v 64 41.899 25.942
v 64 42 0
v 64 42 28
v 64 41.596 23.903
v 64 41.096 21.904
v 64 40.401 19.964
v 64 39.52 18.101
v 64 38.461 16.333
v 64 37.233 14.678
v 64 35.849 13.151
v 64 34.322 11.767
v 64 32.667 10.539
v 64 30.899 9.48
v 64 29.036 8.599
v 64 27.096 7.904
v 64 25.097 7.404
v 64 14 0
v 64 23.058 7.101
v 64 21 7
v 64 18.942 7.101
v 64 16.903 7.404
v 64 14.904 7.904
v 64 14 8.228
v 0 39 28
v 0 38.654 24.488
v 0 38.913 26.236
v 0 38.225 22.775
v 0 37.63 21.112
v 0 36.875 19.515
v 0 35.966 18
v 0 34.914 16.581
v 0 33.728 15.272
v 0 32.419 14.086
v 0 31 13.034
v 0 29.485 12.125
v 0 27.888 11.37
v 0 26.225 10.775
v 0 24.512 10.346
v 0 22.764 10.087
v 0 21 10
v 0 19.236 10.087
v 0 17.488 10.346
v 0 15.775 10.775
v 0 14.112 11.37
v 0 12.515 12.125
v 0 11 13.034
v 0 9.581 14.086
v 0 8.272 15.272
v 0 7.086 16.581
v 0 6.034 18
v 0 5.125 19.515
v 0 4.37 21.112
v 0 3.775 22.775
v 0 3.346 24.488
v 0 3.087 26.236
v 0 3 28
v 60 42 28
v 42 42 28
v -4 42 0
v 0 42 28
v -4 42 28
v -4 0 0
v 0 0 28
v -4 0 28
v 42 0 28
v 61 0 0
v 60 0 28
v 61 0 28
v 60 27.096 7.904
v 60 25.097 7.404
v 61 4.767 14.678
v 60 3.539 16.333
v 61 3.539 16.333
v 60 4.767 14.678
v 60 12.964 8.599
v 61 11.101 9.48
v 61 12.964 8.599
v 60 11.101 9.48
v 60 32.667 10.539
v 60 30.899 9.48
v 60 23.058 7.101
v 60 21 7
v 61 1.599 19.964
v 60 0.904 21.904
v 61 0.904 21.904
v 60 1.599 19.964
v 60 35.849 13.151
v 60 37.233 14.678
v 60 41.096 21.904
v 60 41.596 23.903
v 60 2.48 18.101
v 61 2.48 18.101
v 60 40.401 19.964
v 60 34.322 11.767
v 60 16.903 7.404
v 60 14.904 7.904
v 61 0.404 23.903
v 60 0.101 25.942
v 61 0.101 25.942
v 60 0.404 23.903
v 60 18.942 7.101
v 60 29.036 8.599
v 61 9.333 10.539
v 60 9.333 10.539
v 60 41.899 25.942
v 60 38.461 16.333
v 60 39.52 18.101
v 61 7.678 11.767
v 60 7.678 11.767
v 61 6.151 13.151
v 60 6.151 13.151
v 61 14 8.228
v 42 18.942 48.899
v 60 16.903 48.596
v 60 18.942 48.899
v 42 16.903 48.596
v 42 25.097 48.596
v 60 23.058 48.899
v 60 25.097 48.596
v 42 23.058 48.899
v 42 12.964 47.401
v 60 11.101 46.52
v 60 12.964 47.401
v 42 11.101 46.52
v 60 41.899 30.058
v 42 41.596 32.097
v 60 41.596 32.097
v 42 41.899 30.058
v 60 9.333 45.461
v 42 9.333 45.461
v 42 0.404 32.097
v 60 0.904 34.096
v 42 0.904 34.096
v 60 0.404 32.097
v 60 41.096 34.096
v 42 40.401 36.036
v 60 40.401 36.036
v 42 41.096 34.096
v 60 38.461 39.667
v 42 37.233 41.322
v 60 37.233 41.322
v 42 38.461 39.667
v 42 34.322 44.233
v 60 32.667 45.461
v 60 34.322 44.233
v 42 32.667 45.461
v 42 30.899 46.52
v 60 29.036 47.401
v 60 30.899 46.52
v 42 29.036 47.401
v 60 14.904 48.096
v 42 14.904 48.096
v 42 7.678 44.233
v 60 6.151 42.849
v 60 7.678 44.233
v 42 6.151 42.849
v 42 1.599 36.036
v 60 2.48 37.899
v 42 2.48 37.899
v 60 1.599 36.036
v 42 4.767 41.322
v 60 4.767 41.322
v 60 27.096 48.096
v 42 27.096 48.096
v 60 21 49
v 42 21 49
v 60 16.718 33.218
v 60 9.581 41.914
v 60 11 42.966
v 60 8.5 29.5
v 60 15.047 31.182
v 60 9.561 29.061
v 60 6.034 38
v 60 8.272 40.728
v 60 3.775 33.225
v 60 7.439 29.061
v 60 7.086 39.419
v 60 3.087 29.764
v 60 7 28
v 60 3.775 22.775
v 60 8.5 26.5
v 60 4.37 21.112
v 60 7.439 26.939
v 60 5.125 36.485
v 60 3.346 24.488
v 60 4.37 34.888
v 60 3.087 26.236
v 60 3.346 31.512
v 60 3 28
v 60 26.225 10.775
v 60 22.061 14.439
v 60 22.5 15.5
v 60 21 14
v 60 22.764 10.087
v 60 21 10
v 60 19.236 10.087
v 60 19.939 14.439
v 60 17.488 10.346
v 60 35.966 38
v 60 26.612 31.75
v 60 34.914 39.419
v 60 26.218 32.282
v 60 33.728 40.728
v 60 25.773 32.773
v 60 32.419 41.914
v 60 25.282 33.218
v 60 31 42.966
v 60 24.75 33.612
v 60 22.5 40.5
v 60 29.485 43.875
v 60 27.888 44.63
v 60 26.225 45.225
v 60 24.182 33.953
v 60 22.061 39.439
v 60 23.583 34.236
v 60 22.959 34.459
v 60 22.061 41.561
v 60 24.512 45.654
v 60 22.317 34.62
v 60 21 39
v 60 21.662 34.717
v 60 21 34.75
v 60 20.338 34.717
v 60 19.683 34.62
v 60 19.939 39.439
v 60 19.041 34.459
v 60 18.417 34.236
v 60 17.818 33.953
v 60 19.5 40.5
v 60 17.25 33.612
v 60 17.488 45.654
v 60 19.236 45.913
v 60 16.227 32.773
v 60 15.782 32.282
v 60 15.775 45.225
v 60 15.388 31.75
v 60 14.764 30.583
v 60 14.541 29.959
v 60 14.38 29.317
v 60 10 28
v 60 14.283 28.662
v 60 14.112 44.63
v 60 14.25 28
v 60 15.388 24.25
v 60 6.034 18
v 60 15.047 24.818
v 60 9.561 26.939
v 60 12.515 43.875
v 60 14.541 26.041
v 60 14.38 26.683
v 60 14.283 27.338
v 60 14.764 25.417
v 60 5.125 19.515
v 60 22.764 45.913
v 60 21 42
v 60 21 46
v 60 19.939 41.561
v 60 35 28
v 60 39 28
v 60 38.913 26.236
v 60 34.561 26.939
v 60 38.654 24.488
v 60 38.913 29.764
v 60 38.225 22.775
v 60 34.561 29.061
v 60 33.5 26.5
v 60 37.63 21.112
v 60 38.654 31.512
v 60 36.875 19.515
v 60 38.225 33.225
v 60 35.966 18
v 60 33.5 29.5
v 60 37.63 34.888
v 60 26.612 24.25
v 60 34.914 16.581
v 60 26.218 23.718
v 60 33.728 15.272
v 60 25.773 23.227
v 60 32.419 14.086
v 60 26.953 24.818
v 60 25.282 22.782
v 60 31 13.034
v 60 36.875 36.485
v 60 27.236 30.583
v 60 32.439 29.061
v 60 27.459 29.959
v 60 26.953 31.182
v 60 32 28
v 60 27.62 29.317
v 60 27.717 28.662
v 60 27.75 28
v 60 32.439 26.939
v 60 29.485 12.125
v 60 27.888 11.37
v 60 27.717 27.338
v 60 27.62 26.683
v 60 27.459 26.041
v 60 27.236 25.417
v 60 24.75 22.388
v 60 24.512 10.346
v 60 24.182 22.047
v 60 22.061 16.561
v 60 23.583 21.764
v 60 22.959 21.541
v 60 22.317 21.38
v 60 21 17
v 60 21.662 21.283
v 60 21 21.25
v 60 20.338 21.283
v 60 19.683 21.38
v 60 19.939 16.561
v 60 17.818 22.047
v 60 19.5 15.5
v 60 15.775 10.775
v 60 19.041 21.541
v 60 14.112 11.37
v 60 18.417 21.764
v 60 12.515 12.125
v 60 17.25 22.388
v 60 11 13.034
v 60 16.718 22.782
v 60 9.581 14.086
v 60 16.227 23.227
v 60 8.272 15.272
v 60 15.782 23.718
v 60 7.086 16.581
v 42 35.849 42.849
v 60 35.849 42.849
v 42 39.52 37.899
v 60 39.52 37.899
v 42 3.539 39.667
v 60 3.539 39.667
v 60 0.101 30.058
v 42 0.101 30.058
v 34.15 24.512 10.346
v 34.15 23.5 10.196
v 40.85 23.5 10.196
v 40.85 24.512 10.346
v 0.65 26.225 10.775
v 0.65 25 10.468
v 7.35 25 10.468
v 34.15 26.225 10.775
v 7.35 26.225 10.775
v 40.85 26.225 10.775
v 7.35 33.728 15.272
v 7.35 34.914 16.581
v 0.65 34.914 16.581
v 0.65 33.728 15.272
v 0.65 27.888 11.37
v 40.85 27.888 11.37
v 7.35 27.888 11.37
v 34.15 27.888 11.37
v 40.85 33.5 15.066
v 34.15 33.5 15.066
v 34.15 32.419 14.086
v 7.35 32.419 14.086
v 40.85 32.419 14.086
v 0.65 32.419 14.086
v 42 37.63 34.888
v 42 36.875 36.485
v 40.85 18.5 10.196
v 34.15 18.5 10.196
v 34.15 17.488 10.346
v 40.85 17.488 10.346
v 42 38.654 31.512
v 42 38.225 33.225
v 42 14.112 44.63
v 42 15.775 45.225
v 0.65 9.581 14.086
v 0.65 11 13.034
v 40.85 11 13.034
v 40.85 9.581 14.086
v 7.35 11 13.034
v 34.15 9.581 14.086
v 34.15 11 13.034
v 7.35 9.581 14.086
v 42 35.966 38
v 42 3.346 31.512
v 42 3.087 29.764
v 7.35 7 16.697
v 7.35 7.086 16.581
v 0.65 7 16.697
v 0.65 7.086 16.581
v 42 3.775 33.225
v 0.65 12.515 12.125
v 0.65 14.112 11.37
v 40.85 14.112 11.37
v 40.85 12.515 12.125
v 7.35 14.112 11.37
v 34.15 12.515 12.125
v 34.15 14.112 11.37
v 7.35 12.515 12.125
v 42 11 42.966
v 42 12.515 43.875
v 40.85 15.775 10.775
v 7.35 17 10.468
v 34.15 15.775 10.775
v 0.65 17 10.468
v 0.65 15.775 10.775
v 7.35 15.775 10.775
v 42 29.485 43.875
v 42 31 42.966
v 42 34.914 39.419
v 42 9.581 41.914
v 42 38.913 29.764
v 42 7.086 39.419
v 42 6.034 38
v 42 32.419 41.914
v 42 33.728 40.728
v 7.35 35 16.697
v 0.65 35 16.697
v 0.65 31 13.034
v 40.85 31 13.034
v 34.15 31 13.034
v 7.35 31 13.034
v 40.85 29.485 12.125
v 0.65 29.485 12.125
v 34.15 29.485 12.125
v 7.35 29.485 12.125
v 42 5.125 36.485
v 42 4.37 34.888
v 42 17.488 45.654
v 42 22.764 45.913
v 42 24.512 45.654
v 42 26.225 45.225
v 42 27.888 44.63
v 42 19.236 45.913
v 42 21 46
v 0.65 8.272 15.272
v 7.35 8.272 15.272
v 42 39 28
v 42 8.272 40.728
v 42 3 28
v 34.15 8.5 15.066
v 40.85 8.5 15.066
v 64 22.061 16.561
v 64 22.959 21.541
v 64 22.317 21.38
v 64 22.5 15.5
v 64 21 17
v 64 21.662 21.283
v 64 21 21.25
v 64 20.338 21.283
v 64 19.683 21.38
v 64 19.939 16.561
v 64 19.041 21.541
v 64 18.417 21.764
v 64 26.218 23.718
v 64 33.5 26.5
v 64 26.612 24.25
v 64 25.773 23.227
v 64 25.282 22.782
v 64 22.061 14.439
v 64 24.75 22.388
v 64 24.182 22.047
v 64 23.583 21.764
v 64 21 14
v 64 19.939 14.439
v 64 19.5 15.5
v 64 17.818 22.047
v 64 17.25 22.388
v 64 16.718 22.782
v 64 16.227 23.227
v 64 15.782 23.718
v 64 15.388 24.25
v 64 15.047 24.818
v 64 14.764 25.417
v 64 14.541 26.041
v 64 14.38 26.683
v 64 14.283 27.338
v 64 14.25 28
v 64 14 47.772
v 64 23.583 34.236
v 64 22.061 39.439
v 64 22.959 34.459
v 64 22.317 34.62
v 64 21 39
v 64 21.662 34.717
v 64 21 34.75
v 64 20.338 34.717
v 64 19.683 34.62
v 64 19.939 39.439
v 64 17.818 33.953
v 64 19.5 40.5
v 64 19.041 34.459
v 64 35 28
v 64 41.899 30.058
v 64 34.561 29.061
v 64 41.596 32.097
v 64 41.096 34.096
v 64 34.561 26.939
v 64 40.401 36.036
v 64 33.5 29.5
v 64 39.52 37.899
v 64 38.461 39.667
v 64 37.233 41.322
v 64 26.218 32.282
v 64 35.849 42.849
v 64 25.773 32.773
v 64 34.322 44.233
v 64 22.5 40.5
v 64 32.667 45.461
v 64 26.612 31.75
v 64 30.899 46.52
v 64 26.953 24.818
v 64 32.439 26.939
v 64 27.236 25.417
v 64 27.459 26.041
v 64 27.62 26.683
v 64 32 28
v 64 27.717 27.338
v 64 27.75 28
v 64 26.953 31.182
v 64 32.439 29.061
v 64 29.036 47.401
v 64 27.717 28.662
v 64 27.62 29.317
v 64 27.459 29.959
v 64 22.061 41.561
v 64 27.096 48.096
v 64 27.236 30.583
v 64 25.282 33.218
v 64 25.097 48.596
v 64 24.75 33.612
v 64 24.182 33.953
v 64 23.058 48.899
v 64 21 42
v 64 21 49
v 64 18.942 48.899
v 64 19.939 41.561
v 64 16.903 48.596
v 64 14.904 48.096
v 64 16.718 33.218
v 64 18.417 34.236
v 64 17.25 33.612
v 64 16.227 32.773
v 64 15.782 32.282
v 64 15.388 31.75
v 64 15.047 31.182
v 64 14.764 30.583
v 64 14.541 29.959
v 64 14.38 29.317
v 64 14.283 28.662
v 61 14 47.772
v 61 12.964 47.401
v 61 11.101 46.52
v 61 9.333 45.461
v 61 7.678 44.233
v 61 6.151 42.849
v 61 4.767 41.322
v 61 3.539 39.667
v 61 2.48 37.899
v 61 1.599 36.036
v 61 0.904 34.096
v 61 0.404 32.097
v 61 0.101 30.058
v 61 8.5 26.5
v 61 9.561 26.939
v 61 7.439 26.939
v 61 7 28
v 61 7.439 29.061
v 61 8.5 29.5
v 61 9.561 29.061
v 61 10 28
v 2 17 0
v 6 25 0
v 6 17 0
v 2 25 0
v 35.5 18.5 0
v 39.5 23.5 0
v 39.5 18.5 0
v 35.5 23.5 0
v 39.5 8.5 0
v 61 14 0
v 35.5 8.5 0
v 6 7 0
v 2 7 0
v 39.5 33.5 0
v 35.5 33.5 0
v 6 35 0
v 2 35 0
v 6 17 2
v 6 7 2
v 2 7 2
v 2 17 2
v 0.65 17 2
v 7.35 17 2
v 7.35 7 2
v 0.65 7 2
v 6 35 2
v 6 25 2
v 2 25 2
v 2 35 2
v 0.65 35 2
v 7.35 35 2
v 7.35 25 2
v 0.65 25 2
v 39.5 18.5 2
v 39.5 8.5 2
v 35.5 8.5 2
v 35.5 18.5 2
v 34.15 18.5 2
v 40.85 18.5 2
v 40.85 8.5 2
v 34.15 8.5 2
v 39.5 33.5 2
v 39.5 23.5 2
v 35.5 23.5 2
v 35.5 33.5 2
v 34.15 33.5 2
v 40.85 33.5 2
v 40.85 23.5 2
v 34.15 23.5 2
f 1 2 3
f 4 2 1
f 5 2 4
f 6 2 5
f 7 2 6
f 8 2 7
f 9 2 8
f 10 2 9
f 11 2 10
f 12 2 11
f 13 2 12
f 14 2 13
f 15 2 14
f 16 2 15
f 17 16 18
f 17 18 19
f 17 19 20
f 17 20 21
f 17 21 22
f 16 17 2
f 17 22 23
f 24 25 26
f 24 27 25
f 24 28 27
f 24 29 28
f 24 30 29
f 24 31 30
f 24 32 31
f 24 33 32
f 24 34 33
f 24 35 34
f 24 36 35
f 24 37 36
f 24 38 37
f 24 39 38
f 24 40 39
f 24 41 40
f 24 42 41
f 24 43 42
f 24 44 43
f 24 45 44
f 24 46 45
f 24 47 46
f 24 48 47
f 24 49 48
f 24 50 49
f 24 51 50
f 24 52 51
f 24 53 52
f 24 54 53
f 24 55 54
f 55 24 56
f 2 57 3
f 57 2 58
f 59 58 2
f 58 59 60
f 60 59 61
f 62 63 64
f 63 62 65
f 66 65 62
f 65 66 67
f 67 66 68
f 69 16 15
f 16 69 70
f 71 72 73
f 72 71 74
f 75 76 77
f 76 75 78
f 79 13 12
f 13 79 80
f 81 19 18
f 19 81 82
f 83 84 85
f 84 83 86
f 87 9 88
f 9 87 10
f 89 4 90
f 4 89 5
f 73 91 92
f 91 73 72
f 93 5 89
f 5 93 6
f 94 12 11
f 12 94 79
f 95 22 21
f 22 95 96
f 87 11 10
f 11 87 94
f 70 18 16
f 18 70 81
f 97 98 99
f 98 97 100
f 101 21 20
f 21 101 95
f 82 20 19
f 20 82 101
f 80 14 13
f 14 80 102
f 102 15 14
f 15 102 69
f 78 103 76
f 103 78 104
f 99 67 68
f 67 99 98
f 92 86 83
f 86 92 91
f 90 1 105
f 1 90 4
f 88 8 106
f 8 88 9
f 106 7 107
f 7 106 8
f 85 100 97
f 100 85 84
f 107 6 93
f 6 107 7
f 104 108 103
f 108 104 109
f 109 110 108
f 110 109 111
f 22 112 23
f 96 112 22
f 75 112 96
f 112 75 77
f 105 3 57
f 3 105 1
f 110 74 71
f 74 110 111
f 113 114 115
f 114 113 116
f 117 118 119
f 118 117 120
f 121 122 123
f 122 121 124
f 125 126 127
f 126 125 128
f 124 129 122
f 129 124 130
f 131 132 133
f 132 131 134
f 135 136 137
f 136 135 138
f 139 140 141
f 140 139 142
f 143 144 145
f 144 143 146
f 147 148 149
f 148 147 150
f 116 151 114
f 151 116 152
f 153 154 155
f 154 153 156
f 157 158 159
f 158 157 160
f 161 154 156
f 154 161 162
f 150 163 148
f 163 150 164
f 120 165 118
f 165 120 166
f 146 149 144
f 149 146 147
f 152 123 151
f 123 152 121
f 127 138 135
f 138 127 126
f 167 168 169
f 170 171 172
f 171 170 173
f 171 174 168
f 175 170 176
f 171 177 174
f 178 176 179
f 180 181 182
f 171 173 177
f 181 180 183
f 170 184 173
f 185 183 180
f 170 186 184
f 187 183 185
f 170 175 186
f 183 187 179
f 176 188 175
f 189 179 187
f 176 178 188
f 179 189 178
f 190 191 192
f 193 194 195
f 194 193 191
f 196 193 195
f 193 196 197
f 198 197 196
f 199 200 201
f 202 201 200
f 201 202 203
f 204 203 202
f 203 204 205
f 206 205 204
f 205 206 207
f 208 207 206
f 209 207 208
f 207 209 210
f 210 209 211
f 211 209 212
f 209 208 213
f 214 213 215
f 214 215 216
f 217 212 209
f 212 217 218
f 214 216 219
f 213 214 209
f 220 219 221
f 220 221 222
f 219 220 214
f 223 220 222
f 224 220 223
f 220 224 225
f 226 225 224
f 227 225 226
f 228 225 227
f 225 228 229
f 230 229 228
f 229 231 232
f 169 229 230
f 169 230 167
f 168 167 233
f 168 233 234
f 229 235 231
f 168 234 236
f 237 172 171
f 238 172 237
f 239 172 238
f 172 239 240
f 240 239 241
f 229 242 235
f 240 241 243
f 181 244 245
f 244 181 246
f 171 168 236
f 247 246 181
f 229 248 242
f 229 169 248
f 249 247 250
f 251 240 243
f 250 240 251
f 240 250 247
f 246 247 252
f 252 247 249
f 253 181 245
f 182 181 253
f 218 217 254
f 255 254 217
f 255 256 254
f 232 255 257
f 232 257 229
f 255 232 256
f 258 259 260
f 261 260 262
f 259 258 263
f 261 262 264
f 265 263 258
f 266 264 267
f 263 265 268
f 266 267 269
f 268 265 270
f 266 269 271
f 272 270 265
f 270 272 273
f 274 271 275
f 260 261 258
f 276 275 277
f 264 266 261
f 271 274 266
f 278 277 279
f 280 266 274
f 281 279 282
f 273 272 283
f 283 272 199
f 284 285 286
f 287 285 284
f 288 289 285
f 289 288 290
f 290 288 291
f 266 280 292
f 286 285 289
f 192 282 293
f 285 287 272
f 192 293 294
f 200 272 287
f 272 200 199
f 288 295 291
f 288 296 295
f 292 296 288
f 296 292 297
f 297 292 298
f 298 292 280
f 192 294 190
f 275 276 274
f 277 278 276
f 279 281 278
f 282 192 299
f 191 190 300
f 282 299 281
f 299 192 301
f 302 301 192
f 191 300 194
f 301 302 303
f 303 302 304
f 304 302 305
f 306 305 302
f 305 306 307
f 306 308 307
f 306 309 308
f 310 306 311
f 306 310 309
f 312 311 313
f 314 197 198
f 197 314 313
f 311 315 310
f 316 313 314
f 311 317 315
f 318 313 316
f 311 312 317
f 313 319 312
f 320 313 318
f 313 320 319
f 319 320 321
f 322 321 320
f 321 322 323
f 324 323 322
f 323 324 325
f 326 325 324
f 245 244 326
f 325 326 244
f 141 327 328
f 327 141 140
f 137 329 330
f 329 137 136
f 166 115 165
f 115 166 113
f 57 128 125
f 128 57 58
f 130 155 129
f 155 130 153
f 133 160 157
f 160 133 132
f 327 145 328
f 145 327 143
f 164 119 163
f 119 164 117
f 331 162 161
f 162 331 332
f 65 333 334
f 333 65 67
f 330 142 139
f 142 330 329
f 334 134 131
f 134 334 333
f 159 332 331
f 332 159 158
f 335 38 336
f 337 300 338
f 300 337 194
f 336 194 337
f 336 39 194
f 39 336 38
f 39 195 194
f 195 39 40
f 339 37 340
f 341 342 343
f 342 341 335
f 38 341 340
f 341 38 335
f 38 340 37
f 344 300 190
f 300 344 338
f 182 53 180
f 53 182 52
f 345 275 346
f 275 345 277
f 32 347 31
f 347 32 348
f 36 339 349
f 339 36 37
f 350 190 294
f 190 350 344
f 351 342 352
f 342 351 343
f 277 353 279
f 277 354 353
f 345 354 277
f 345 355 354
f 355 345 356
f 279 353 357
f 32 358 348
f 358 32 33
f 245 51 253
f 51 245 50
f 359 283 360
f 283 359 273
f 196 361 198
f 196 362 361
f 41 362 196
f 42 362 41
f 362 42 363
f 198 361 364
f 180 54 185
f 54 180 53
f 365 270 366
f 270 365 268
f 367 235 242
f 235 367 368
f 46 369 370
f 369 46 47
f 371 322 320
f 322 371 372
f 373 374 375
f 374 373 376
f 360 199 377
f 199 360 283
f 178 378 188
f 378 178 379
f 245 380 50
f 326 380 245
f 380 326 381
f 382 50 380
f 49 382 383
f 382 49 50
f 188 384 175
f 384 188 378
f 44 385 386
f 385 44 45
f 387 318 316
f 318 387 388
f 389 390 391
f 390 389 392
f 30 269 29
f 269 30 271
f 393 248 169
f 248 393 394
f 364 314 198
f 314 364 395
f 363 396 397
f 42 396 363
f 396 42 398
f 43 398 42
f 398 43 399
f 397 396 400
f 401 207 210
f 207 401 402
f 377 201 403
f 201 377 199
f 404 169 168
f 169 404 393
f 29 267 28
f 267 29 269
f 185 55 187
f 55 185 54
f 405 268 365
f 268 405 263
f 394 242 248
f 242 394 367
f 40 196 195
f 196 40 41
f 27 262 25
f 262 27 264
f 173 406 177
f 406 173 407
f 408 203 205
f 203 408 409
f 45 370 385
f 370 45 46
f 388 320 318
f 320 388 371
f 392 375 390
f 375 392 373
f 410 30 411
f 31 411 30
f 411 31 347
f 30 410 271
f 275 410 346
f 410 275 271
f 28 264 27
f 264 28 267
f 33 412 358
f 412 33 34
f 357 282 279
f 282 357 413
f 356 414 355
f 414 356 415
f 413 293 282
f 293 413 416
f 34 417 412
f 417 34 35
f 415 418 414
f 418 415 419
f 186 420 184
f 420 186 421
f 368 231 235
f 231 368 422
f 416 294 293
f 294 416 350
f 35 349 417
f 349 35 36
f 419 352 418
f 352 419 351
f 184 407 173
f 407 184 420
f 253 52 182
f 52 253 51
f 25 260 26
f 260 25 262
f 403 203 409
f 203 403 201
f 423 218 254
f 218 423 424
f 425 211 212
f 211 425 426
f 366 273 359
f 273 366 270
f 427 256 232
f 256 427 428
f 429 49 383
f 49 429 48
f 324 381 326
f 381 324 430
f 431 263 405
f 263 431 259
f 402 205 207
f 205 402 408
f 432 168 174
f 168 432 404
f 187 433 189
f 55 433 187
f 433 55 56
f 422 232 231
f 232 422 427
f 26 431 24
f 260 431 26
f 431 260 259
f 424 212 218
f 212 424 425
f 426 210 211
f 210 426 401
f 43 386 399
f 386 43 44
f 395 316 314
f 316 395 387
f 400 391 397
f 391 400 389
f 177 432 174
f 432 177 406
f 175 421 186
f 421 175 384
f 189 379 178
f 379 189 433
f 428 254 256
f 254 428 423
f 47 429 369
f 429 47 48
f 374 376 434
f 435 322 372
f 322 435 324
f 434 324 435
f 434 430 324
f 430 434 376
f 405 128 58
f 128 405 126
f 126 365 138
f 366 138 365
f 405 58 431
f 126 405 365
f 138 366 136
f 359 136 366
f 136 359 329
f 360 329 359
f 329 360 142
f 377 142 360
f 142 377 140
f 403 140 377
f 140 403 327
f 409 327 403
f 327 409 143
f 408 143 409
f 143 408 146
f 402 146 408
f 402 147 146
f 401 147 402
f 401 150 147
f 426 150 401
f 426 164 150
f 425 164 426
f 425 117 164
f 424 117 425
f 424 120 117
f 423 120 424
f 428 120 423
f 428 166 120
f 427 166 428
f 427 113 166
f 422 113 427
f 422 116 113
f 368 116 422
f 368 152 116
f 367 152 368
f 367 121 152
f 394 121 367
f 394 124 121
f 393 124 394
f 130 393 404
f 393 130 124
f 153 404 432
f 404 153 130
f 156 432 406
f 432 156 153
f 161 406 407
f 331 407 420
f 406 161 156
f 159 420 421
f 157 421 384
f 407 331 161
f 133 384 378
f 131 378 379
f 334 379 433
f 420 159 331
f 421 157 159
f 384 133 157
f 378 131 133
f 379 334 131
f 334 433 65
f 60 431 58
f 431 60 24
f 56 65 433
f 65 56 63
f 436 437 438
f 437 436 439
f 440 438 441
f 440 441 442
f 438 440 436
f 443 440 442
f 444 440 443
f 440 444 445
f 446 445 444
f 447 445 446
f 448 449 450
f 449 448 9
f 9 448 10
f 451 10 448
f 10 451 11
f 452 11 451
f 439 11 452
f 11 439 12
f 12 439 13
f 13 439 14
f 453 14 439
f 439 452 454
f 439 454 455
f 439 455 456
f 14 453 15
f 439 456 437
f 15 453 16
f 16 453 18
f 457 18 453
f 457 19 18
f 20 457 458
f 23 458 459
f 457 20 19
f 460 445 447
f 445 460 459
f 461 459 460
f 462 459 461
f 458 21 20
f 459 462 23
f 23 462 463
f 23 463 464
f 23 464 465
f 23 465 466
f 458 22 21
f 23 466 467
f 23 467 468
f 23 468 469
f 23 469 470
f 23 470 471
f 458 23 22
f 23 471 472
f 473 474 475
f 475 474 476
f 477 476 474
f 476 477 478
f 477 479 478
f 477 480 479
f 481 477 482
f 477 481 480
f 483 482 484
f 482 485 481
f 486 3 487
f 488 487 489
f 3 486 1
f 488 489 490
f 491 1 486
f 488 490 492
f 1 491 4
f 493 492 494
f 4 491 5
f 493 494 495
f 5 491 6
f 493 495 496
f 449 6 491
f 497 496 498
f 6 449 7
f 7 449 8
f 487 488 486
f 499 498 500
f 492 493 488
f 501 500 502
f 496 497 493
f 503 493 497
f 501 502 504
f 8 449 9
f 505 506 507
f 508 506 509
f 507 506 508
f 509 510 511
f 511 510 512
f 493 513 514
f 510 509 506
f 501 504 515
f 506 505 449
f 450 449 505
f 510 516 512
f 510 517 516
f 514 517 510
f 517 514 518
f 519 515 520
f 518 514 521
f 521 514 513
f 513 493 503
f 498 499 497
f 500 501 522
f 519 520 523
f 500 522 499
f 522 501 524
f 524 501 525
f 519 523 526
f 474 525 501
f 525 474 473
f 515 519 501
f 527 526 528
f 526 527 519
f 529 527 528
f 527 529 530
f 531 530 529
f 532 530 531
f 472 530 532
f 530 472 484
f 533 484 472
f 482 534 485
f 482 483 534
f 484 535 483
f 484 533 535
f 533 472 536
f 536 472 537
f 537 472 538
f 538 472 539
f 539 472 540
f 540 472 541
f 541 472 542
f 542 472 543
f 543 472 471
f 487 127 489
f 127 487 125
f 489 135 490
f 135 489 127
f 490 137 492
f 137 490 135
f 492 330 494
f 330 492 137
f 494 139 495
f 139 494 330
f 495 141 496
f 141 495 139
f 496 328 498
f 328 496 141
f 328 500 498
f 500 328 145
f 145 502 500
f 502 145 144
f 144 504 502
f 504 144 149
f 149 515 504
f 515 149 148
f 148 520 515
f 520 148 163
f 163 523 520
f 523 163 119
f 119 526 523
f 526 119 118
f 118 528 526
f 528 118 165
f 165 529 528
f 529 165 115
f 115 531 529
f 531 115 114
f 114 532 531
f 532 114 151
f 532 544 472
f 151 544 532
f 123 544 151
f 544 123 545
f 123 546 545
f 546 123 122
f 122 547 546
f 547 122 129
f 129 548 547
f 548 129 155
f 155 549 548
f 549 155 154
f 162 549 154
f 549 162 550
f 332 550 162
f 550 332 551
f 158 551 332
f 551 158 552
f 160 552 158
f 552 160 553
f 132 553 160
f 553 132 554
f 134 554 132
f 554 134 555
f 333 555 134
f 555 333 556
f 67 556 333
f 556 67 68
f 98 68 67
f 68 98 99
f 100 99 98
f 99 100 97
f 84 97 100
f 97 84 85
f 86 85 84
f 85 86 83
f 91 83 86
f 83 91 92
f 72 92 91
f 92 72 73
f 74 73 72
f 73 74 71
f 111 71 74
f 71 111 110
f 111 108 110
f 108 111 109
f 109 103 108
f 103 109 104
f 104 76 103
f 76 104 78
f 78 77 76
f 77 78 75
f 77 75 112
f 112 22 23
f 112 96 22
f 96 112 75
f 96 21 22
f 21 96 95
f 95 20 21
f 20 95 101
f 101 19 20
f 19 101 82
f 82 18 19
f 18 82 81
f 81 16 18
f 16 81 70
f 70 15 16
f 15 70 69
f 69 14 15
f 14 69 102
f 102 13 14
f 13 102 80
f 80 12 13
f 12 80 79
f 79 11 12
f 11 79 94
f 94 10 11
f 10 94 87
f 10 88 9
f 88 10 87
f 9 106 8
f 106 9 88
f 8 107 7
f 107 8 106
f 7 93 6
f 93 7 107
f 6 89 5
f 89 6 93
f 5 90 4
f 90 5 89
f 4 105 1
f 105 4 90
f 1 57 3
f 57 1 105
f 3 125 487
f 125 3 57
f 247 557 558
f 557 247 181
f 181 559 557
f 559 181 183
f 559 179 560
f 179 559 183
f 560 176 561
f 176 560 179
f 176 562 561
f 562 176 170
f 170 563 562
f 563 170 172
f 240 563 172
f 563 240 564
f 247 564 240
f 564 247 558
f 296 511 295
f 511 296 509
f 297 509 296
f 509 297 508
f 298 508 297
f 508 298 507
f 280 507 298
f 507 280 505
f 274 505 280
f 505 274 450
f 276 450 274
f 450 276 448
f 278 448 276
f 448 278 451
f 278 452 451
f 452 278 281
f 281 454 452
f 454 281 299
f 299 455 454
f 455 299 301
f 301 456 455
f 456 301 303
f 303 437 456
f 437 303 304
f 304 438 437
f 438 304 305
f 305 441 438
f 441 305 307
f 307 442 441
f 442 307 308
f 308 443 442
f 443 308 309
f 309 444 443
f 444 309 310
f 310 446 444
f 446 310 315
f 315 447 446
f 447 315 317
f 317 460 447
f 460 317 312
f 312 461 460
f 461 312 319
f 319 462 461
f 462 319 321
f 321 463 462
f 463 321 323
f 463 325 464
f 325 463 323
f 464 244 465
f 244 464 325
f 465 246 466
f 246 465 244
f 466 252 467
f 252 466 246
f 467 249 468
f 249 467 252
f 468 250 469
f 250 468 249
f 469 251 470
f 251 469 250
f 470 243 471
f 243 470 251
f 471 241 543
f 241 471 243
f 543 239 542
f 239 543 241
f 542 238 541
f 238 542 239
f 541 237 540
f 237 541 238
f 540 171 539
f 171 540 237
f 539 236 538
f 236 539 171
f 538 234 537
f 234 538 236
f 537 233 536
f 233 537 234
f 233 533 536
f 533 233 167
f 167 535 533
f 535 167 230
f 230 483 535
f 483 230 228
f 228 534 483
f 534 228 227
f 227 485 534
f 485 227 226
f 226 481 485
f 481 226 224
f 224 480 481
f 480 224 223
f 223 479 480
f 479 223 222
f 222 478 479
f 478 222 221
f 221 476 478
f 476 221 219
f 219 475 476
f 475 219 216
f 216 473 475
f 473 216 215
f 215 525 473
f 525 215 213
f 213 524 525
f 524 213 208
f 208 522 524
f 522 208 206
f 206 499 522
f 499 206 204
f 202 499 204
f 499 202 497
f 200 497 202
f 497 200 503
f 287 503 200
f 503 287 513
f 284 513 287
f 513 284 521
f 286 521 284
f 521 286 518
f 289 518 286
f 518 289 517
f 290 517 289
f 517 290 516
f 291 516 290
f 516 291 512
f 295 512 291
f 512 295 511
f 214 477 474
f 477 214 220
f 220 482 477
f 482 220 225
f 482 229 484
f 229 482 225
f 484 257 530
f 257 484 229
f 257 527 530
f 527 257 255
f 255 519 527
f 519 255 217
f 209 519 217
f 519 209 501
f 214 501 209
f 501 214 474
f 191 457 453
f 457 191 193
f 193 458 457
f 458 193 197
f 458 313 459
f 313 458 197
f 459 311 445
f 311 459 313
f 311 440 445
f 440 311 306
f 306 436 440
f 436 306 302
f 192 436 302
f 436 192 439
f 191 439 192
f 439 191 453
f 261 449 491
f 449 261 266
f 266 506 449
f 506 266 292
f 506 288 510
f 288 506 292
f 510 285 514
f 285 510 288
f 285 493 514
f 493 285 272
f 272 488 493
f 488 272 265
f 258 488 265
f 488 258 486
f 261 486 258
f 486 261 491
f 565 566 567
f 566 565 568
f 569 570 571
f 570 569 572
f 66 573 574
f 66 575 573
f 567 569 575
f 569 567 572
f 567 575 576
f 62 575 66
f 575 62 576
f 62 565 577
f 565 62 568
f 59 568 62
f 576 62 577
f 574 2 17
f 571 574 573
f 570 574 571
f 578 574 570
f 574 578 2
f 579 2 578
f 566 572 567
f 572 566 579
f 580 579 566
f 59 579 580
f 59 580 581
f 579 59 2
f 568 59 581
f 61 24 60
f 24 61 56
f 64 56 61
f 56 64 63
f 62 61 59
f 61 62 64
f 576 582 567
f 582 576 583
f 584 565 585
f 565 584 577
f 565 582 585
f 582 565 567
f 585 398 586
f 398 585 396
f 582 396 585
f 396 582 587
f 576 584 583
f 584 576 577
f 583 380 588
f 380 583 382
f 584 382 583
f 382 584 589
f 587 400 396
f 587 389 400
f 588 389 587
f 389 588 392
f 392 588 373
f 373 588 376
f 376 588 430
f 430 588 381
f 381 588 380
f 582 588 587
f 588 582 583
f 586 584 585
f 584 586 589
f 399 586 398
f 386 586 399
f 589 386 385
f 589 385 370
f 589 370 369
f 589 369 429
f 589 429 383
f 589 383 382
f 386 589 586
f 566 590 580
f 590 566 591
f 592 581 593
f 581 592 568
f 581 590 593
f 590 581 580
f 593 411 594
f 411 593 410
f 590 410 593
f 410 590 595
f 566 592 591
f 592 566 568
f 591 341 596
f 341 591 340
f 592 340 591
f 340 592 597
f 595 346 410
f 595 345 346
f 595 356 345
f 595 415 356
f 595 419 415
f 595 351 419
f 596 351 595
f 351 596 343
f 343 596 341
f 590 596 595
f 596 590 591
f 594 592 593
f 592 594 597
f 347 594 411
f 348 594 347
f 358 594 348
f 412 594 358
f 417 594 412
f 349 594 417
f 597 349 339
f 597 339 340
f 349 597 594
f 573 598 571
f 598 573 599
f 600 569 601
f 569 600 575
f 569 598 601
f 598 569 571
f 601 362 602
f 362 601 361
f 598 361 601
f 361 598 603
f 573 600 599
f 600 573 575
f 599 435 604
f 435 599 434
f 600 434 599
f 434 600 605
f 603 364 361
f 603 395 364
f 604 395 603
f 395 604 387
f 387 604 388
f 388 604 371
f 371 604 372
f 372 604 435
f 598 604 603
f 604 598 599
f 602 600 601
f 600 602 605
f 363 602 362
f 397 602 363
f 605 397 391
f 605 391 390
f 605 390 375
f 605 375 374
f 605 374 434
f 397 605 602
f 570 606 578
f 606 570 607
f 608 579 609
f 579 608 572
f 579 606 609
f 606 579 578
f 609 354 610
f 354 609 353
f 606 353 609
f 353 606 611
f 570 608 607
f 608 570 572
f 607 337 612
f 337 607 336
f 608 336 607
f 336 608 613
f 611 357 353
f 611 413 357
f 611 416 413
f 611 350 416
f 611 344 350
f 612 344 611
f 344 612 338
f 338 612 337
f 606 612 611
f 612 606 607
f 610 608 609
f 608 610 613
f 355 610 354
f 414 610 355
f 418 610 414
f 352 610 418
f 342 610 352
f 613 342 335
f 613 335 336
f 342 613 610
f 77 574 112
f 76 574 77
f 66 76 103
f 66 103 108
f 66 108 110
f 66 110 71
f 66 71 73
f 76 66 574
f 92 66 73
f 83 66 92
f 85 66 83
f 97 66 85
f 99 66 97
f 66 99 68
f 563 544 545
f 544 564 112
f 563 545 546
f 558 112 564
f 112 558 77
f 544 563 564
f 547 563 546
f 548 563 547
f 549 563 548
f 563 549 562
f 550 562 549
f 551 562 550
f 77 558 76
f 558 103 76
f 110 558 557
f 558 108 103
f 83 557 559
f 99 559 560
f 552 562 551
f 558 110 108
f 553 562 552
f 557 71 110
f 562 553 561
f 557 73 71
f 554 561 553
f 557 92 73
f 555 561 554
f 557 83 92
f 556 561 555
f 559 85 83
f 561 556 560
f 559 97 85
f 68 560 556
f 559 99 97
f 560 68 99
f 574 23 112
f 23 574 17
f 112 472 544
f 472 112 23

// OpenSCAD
fn=64;		// Resolution for circular shapes
$fn=fn;		// Set global resolution for circles
//? fragment; sizes 
// Motor dimensions
motor_d=36;			// Motor diameter
motor_l=60;			// Motor length

// Plate parameters
plate_screw_d = 3;			// Diameter of plate screw holes
plate_screw_off = 25/2;		// Offset of screw holes from center
plate_gear_hole_d = 13.5;	// Diameter of gear hole
plate_gear_hole_l = 16;		// Depth of gear hole

// Bottom screw offsets
bottom_screw_1_gap_y = 18;
bottom_screw_2_gap_y = 15;
bottom_screw_1_gap_x = 4;
bottom_screw_2_gap_x = 37.5;

// Thickness parameters
plate_h=4;			// Plate thickness
bottom_t = 7;		// Bottom thickness
front_t = 3;		// Front thickness for casing walls

// Motor case calculations
motor_case_d = motor_d + front_t * 2;  // Outer diameter including front thickness

// Position offsets
motor_plate_y = 14;
motor_plate_x_off = 1;

// Subtracting inner components from the main shape
difference()
{
	translate([0,0,bottom_t])
	//? union?
	union()
	{
		// Add motor mounting plate
		//? translate
		translate([motor_l,motor_case_d/2,motor_case_d/2])
		rotate([0,90,0])
		plate(plate_h=plate_h);
		// Create the motor casing with subtractions for motor and cutouts
		difference()
		{
			//test();
			motor_case();

			// Subtract space for motor inside the case
			translate([0,front_t,front_t])
			motor();

			// Create cutout section inside motor case
			translate([0,0,motor_case_d/2])
			cube([motor_l-18, motor_case_d, motor_case_d/2]);
		}

		// Bottom support base for the motor casing
		translate([0,0,-bottom_t])
		cube([motor_l+plate_h, motor_case_d, bottom_t]);
    
    // Back support plate (ass)
    translate([-4,0,-bottom_t])
    cube([4,motor_case_d,(motor_case_d/2)+bottom_t]);
	}

	// Cutting out space for motor plate attachment
	translate([motor_l+motor_plate_x_off,0,0])
	cube([plate_h,motor_plate_y,motor_case_d+bottom_t]);

	// Add bottom screw holes (hidden in preview using #)
	#translate([0,front_t,4])
	bottom_screws();
}

// Creates the outer motor case
module motor_case()
{
	translate([0,motor_case_d/2,motor_case_d/2])
	rotate([0,90,0])
	cylinder(d=motor_case_d, h=motor_l);

	// Subtract a slot for motor fitting
	difference()
	{
		cube([motor_l+plate_h, motor_case_d, motor_case_d/2]);
		translate([0,motor_case_d/2,motor_case_d/2])
		rotate([0,90,0])
		cylinder(d=motor_case_d, h=motor_l+plate_h);
	}
}


// Places screws at the bottom of the casing
module bottom_screws()
{
	// back screws
	translate([bottom_screw_1_gap_x, (motor_d-bottom_screw_1_gap_y)/2, 0])
	{
		screwCube(); //right
		translate([0,bottom_screw_1_gap_y,0])
		screwCube(); //left
	}

	// front screw
	translate([bottom_screw_2_gap_x, (motor_d-bottom_screw_2_gap_y)/2, 0])
	{
		screwCube(); //right
		translate([0,bottom_screw_2_gap_y,0])
		screwCube(); //left
	}
}

module screwCube(w1=4,w2=6.7, depth=10, height=20)
{
    cube([w1,depth,height], true); // Bottom
    translate([0,0,8]) //5 (0 point) 3mm nut height
		cube([w2,depth,height], true); // Top
}

// Creates a screw with a head and shaft
module screw(d1=8, d2=5, l2=20, l1=50)
{
	cylinder(d=d1, h=l1, $fn=fn/4);  // Top screw (body)
	translate([0,0,-l2])
	cylinder(d=d2, h=l2, $fn=fn/4);  // Bottom screw (head)
}

// Creates the motor shape inside the casing
module motor()
{
	translate([0,motor_d/2,motor_d/2])
	rotate([0,90,0])
	union()
	{
		cylinder(d=motor_d, h=motor_l);  // Main motor body
		cylinder(d=plate_gear_hole_d, h=motor_l+plate_gear_hole_l);  // Gear shaft
	}
}

// Creates the motor mounting plate with screw holes
module plate(plate_h=1.5)
{
	rotate([0,0,180])
	difference()
	{
		linear_extrude(height = plate_h)
		difference()
		{
			circle(d=motor_case_d);       // Outer plate diameter
		  circle(d=plate_gear_hole_d);   // Gear hole cutout

			// Screw holes at each quadrant of the plate
			translate([plate_screw_off,0,0])
			circle(d=plate_screw_d,$fn=fn/8);

			translate([-plate_screw_off,0,0])
			circle(d=plate_screw_d,$fn=fn/8);

			translate([0,plate_screw_off,0])
			circle(d=plate_screw_d,$fn=fn/8);

			translate([0,-plate_screw_off,0])
			circle(d=plate_screw_d,$fn=fn/8);
		}
	}
}
